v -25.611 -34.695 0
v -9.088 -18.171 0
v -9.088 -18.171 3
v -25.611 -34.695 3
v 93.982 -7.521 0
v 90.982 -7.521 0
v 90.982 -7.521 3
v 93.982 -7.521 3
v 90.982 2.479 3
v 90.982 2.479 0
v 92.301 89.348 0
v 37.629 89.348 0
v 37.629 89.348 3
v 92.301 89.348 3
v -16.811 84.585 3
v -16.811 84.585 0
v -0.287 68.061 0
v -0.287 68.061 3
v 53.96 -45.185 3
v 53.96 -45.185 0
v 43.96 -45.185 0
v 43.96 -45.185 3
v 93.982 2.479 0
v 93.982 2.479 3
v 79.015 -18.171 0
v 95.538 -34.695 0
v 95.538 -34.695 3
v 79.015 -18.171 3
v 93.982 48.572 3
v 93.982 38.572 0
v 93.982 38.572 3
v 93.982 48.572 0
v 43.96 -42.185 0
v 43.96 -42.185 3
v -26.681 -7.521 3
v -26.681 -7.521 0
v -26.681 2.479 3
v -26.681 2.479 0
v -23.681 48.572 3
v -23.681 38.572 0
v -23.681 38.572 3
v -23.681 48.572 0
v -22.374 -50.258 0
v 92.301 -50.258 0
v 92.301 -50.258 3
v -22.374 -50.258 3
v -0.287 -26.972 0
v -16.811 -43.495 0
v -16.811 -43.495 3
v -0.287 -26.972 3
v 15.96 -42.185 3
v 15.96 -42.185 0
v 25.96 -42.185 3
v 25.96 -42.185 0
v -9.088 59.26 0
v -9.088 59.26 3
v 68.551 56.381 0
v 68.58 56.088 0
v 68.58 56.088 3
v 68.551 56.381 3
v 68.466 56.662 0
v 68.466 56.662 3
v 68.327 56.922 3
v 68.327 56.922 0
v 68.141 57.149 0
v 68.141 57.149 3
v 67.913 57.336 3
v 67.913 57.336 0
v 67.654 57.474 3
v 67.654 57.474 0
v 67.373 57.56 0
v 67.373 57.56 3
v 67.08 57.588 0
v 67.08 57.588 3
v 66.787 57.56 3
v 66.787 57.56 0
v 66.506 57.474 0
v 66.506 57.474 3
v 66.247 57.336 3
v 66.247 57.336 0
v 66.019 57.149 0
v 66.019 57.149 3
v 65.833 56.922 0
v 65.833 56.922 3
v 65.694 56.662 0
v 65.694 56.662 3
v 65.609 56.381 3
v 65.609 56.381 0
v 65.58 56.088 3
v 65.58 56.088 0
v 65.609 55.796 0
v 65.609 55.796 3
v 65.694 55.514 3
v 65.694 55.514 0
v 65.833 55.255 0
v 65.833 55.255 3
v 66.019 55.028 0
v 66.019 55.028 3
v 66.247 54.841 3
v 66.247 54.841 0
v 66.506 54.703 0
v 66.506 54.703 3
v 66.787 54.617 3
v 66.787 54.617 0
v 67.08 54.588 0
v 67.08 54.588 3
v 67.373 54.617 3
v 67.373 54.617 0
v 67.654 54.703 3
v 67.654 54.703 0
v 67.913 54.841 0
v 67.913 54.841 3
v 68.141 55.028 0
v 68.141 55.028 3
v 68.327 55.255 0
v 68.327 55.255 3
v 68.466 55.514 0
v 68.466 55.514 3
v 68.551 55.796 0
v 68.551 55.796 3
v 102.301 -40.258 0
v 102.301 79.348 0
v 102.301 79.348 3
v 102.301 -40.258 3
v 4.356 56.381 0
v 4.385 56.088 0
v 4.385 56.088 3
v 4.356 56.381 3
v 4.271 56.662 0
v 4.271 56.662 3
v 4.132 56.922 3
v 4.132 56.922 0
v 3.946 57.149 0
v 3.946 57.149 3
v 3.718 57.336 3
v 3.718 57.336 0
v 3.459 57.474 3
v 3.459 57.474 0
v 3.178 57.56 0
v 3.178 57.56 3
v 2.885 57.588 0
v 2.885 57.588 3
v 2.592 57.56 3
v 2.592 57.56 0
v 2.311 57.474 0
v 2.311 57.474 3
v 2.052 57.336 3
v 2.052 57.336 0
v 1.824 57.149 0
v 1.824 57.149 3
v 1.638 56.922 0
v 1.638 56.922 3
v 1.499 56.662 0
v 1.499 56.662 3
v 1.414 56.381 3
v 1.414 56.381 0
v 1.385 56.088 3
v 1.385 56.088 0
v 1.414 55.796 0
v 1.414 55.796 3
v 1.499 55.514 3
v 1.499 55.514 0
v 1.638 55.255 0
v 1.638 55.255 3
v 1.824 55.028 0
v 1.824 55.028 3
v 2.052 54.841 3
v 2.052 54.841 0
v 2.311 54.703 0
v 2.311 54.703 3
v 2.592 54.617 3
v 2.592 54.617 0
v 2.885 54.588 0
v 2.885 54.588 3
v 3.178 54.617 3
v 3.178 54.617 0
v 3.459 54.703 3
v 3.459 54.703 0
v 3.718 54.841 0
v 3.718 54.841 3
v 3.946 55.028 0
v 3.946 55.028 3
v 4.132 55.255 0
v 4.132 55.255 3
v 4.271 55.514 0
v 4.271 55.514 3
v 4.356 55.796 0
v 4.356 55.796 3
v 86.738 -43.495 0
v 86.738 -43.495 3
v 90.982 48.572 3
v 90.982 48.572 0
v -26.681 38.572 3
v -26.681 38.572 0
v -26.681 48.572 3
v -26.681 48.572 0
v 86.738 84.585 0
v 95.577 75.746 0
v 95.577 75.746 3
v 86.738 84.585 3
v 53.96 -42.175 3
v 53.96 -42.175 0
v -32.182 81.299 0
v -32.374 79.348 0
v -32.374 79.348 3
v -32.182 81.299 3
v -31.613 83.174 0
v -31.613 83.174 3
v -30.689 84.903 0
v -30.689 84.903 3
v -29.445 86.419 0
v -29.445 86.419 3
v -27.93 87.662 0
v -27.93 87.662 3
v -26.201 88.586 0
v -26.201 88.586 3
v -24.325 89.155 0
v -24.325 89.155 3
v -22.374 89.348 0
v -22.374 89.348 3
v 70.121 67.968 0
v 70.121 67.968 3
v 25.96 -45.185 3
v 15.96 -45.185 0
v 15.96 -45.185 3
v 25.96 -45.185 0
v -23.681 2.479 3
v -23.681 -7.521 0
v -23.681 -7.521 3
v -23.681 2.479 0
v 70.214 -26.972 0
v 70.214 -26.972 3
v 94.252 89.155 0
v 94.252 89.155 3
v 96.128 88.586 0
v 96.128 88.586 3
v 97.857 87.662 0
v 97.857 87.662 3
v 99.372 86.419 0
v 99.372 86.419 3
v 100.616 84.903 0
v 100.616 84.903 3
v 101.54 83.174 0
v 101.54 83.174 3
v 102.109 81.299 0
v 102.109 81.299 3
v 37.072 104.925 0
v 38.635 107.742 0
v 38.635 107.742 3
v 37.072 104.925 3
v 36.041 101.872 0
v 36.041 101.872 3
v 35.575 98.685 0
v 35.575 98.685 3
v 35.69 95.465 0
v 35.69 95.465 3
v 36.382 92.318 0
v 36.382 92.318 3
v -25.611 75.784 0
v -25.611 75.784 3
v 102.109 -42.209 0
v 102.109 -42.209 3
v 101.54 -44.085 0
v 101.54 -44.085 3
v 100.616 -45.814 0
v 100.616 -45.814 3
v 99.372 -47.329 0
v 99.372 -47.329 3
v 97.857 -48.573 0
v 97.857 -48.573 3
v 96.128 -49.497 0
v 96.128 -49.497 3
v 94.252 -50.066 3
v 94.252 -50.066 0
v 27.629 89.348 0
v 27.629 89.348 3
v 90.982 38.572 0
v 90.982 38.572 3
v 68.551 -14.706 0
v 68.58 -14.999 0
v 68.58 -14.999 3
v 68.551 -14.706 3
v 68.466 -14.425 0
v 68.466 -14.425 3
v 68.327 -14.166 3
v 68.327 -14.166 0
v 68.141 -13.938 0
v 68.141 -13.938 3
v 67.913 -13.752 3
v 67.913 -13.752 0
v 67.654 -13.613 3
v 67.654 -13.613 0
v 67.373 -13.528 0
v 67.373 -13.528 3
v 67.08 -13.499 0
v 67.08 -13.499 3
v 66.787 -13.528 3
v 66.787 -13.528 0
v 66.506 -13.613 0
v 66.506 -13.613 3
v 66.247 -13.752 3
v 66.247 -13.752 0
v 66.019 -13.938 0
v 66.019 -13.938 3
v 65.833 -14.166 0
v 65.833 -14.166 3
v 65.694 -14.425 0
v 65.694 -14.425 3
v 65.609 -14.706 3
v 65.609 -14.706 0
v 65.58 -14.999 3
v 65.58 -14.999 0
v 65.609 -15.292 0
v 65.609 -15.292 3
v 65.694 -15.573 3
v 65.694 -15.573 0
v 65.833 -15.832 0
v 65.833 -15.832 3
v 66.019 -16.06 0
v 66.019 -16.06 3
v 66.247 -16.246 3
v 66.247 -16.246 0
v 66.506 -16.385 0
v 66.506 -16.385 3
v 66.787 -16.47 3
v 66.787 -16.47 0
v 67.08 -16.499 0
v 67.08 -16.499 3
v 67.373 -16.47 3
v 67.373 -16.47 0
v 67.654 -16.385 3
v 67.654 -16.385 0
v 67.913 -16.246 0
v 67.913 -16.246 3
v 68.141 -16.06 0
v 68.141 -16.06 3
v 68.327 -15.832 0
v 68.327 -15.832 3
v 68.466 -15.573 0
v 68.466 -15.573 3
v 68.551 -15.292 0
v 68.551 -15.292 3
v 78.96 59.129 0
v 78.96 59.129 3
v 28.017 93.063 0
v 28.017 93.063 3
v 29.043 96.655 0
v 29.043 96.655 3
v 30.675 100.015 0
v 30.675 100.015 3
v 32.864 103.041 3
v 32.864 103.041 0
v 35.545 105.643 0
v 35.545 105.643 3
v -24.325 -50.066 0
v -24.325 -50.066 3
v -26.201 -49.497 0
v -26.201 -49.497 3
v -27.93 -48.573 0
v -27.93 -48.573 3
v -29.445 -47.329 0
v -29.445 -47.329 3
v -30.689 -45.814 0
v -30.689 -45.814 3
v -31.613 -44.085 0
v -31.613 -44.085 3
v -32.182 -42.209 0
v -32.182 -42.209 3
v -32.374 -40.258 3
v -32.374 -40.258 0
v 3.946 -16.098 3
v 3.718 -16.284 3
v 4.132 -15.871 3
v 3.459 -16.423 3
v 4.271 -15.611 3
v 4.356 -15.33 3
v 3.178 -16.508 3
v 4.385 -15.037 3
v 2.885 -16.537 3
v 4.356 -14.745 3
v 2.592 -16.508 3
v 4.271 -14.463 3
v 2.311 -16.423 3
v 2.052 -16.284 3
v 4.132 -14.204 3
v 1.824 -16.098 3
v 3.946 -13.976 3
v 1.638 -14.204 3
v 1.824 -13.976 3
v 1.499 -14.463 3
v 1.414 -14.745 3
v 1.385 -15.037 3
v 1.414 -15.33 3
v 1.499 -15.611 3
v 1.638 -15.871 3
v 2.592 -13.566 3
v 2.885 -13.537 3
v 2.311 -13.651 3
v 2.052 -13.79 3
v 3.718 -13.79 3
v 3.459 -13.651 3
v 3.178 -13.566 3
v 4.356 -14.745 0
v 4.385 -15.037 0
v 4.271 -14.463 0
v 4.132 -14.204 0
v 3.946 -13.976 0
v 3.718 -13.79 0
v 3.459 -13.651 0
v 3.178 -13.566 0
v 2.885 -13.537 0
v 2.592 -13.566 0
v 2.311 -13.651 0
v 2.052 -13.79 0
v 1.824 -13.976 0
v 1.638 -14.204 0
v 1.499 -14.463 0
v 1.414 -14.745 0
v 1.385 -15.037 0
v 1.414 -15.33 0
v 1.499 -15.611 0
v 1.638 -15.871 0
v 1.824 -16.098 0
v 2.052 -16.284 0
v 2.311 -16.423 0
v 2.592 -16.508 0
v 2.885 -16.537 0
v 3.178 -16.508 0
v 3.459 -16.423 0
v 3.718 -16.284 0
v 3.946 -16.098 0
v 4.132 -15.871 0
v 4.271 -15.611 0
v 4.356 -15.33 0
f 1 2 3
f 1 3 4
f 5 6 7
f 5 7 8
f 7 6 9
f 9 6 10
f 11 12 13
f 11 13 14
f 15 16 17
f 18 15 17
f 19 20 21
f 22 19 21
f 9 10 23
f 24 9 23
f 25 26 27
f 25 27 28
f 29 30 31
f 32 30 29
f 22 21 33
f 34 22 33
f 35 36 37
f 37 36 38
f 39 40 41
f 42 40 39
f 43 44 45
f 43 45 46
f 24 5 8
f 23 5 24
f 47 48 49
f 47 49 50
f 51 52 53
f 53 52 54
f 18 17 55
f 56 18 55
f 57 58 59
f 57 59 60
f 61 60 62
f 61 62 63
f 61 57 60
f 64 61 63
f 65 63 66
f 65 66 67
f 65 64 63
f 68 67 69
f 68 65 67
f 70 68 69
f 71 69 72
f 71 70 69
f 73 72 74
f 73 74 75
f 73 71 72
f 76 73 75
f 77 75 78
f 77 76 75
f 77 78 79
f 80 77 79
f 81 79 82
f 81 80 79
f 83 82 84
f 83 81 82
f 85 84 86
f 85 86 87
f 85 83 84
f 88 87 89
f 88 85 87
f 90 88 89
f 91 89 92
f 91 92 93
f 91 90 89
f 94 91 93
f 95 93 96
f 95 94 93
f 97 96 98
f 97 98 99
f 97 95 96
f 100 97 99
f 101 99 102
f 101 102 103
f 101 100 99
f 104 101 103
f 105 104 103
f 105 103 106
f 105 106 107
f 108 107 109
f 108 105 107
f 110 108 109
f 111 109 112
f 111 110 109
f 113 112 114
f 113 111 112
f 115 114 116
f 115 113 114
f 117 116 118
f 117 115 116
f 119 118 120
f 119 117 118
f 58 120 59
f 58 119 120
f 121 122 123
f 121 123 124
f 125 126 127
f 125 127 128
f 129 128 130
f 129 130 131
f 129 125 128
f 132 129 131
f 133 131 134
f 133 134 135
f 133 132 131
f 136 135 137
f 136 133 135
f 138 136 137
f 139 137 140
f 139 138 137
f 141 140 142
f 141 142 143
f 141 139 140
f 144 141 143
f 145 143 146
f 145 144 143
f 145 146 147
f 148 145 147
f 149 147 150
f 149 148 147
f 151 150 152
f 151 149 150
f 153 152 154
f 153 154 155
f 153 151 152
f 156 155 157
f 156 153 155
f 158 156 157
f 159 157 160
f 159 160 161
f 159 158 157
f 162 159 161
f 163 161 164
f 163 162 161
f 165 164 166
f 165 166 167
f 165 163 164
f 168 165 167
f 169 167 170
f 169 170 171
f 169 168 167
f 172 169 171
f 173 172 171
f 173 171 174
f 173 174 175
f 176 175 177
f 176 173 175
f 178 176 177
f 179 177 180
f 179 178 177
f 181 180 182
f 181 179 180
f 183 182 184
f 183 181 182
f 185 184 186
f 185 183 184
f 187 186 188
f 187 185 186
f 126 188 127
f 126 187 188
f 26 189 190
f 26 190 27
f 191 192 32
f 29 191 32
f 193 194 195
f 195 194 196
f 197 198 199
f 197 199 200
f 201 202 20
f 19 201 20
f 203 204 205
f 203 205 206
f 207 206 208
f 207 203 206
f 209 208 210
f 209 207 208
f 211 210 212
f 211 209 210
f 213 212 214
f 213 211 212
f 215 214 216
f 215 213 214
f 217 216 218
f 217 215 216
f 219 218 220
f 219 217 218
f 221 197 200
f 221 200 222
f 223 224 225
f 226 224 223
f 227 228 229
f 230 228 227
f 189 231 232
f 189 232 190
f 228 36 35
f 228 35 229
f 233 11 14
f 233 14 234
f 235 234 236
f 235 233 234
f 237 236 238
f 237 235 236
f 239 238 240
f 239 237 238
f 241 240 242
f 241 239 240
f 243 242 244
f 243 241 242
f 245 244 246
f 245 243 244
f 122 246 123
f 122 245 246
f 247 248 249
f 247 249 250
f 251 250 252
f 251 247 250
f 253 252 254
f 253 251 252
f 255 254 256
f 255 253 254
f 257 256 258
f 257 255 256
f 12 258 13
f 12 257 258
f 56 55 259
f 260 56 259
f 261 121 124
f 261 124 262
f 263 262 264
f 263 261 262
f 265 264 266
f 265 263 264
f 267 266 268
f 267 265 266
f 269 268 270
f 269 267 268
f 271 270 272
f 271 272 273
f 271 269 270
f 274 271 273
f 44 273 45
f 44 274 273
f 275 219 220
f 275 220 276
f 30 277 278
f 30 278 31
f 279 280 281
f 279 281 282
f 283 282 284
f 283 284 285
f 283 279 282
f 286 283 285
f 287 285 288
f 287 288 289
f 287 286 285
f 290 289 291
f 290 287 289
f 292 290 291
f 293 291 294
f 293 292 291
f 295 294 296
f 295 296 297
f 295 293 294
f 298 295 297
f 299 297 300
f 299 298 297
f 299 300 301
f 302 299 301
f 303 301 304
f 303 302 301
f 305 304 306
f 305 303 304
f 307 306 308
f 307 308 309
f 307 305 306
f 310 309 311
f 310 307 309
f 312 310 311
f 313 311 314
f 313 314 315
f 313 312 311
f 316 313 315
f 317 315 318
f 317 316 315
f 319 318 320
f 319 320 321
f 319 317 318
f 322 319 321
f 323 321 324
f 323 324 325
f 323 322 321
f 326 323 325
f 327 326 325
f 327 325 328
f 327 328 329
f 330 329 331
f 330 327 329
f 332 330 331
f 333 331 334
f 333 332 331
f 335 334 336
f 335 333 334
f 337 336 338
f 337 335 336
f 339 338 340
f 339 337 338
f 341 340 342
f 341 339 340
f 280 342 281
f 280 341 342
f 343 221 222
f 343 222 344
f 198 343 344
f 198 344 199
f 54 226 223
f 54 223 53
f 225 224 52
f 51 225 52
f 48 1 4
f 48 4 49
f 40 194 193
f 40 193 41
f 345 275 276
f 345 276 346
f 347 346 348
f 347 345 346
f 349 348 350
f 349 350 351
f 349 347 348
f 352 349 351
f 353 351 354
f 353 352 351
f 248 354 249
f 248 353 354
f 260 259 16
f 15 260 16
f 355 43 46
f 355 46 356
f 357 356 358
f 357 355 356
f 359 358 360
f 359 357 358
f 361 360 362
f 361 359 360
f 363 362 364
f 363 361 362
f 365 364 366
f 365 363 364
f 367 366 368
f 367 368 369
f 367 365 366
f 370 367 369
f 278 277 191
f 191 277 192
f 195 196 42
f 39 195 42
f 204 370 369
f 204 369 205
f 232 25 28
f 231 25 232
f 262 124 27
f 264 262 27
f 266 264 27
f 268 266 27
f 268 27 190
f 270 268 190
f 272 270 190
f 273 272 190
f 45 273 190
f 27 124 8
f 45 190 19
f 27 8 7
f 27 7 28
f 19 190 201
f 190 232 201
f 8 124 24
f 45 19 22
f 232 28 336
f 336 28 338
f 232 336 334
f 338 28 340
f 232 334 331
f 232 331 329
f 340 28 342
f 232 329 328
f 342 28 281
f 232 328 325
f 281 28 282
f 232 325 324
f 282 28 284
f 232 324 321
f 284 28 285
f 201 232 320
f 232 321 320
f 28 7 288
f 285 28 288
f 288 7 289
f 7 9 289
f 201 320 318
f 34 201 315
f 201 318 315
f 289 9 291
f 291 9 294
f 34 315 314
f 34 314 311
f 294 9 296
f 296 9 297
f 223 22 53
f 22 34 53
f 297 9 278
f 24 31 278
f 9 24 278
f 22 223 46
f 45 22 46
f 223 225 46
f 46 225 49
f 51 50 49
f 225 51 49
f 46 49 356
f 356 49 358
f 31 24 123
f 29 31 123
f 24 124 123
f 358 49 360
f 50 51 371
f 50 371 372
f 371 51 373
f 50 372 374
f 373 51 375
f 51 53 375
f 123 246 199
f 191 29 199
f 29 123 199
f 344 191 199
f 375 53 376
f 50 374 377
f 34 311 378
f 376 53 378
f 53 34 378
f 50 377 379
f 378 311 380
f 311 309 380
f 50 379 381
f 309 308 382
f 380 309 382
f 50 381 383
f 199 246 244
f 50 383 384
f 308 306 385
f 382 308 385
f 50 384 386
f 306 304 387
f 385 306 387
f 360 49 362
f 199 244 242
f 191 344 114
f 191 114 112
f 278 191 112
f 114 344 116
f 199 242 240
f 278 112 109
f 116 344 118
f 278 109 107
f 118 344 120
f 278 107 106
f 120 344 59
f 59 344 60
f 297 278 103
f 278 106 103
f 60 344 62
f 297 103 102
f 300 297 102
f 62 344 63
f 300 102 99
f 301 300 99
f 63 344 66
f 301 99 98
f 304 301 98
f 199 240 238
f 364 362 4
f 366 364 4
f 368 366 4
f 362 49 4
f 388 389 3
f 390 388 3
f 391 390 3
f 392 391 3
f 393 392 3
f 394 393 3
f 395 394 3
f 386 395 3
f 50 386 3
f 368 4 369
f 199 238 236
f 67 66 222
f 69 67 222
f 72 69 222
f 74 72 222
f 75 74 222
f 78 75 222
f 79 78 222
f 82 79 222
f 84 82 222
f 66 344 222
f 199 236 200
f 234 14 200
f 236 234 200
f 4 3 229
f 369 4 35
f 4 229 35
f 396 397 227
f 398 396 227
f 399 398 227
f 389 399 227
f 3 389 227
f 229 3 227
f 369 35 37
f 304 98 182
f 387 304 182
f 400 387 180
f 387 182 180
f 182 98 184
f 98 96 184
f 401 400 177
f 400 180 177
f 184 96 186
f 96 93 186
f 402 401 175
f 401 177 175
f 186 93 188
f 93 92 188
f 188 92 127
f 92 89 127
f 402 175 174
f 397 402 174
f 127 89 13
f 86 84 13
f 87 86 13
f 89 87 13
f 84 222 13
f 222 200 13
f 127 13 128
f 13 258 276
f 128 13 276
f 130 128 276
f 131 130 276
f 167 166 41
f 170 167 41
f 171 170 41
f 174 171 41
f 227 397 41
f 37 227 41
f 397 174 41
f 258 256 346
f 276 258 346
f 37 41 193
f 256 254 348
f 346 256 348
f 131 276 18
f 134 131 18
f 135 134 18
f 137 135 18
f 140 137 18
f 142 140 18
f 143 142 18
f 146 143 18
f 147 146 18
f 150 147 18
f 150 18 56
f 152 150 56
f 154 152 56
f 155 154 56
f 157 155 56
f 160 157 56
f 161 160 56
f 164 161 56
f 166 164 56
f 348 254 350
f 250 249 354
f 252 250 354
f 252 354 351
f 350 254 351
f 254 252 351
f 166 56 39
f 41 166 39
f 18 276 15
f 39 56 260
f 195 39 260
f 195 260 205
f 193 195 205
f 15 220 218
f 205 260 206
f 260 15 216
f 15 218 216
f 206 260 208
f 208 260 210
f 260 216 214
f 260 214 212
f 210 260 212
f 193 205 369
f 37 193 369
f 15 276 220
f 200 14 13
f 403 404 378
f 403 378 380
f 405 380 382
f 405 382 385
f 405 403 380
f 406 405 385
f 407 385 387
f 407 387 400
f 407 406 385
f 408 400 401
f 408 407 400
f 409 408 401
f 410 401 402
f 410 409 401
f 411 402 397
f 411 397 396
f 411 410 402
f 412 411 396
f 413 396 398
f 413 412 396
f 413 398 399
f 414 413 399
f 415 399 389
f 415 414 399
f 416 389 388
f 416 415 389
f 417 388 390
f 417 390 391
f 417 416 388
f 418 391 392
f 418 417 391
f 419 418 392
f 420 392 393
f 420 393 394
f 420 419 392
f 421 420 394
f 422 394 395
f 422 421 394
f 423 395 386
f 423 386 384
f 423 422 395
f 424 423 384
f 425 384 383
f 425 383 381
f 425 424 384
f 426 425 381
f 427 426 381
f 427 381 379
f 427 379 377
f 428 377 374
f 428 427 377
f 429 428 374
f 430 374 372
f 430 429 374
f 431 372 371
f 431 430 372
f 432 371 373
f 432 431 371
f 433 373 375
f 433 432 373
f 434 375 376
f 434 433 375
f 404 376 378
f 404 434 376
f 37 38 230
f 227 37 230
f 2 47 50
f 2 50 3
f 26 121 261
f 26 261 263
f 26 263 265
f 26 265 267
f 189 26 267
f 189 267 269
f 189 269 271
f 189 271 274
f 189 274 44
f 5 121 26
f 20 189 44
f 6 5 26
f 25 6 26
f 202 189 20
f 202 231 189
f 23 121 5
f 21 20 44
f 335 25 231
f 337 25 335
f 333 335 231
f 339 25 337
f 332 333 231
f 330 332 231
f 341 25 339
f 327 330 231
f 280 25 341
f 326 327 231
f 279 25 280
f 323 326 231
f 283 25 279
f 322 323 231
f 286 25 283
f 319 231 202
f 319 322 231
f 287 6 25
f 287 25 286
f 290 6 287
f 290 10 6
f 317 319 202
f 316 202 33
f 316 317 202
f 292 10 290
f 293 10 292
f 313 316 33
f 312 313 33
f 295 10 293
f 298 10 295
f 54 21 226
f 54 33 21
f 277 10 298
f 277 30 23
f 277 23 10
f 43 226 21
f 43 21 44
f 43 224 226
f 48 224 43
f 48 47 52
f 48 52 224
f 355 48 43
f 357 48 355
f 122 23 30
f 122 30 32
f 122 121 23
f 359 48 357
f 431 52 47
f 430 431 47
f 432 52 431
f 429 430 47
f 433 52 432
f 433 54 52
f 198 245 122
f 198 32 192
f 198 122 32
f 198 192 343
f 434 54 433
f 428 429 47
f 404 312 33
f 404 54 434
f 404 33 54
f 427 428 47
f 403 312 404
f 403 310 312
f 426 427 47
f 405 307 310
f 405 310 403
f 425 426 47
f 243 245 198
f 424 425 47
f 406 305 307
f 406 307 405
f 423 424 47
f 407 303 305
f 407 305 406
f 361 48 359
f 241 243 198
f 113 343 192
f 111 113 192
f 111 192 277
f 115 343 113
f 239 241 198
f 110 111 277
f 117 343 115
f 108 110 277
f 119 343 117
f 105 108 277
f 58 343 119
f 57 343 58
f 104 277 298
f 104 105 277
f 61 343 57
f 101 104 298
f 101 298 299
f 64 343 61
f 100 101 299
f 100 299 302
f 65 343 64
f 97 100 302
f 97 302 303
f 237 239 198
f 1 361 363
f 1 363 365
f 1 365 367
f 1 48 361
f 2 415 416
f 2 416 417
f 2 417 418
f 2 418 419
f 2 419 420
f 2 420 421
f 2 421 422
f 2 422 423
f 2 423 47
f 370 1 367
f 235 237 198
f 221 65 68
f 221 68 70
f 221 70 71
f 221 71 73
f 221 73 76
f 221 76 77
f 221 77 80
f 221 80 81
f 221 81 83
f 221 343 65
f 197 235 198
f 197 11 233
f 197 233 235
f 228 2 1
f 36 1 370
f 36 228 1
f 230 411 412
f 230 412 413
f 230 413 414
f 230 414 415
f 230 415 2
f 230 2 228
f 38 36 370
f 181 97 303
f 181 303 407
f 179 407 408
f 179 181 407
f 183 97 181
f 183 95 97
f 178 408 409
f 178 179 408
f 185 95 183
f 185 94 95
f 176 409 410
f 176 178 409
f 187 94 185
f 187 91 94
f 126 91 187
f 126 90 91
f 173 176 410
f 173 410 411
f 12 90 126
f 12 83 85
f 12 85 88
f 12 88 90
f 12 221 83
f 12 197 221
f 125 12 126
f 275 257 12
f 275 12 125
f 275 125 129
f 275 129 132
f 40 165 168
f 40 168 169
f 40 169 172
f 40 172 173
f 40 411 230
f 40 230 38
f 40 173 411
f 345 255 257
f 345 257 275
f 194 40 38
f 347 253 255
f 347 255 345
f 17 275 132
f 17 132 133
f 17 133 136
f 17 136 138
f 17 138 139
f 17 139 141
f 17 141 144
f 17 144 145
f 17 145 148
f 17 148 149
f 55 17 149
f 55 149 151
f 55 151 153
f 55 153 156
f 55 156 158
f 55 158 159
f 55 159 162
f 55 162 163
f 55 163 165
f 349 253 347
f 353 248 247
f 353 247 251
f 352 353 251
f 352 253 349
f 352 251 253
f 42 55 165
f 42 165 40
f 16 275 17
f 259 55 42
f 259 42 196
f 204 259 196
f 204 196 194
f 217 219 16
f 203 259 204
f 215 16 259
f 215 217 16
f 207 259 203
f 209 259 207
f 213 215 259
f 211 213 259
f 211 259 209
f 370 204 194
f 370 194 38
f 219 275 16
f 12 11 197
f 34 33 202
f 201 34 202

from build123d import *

# Parameters (mm, degrees)
MODEL_R                 = 1.5
MODEL_W                 = 10
MODEL_H                 = 3
MODEL_W_2               = 3
MODEL_H_2               = 10
SALIENTE_EXTRUIR1_DEPTH = 3


with BuildPart() as part:
    # Model → Saliente-Extruir1 (new body)
    with BuildSketch(Plane.XY):
        with BuildLine():
            Line((-32.374234998, -40.258280816), (-32.374234998, 79.347619184))
            ThreePointArc((-32.374234998, 79.347619184), (-29.44530281, 86.418686996), (-22.374234998, 89.347619184))
            Line((-22.374234998, 89.347619184), (27.629122048, 89.347619184))
            ThreePointArc((27.629122048, 89.347619184), (30.675210948, 100.014701803), (38.63501695, 107.741719184))
            ThreePointArc((38.63501695, 107.741719184), (35.575059813, 98.684501141), (37.629122048, 89.347619184))
            Line((37.629122048, 89.347619184), (92.301279094, 89.347619184))
            ThreePointArc((92.301279094, 89.347619184), (99.372346906, 86.418686996), (102.301279094, 79.347619184))
            Line((102.301279094, 79.347619184), (102.301279094, -40.258280816))
            ThreePointArc((102.301279094, -40.258280816), (99.372346906, -47.329348628), (92.301279094, -50.258280816))
            Line((92.301279094, -50.258280816), (-22.374234998, -50.258280816))
            ThreePointArc((-22.374234998, -50.258280816), (-29.44530281, -47.329348628), (-32.374234998, -40.258280816))
        make_face()
        with Locations((67.080084989, -14.999118146)):
            Circle(MODEL_R, mode=Mode.SUBTRACT)
        with Locations((2.884992575, -15.037151741)):
            Circle(MODEL_R, mode=Mode.SUBTRACT)
        with Locations((2.884992575, 56.088341611)):
            Circle(MODEL_R, mode=Mode.SUBTRACT)
        with Locations((67.080084989, 56.088341611)):
            Circle(MODEL_R, mode=Mode.SUBTRACT)
        Polygon((43.960184493, -45.18534075), (43.960184493, -42.18534075), (53.960179079, -42.17493485), (53.960179079, -45.18534075), align=None, mode=Mode.SUBTRACT)
        with Locations((20.960165002, -43.68534075)):
            Rectangle(MODEL_W, MODEL_H, mode=Mode.SUBTRACT)
        Polygon((-0.287033943, 68.061018129), (-9.087685043, 59.260369229), (-25.611384998, 75.784069184), (-16.810734998, 84.584719184), align=None, mode=Mode.SUBTRACT)
        Polygon((78.959502691, 59.128875015), (95.576512855, 75.745885675), (86.737677959, 84.584720308), (70.120668893, 67.967710748), align=None, mode=Mode.SUBTRACT)
        Polygon((-25.611384913, -34.694730812), (-16.810686053, -43.495431871), (-0.28698502, -26.971730838), (-9.087686285, -18.171028474), align=None, mode=Mode.SUBTRACT)
        Polygon((86.737728061, -43.495431849), (95.538379094, -34.694780816), (79.014679094, -18.171080816), (70.214029117, -26.971730793), align=None, mode=Mode.SUBTRACT)
        with Locations((92.48239949, 43.571870396)):
            Rectangle(MODEL_W_2, MODEL_H_2, mode=Mode.SUBTRACT)
        with Locations((92.48239949, -2.520680527)):
            Rectangle(MODEL_W_2, MODEL_H_2, mode=Mode.SUBTRACT)
        with Locations((-25.18093295, -2.520680527)):
            Rectangle(MODEL_W_2, MODEL_H_2, mode=Mode.SUBTRACT)
        with Locations((-25.18093295, 43.571870396)):
            Rectangle(MODEL_W_2, MODEL_H_2, mode=Mode.SUBTRACT)
    extrude(amount=SALIENTE_EXTRUIR1_DEPTH)


solid = part.part
